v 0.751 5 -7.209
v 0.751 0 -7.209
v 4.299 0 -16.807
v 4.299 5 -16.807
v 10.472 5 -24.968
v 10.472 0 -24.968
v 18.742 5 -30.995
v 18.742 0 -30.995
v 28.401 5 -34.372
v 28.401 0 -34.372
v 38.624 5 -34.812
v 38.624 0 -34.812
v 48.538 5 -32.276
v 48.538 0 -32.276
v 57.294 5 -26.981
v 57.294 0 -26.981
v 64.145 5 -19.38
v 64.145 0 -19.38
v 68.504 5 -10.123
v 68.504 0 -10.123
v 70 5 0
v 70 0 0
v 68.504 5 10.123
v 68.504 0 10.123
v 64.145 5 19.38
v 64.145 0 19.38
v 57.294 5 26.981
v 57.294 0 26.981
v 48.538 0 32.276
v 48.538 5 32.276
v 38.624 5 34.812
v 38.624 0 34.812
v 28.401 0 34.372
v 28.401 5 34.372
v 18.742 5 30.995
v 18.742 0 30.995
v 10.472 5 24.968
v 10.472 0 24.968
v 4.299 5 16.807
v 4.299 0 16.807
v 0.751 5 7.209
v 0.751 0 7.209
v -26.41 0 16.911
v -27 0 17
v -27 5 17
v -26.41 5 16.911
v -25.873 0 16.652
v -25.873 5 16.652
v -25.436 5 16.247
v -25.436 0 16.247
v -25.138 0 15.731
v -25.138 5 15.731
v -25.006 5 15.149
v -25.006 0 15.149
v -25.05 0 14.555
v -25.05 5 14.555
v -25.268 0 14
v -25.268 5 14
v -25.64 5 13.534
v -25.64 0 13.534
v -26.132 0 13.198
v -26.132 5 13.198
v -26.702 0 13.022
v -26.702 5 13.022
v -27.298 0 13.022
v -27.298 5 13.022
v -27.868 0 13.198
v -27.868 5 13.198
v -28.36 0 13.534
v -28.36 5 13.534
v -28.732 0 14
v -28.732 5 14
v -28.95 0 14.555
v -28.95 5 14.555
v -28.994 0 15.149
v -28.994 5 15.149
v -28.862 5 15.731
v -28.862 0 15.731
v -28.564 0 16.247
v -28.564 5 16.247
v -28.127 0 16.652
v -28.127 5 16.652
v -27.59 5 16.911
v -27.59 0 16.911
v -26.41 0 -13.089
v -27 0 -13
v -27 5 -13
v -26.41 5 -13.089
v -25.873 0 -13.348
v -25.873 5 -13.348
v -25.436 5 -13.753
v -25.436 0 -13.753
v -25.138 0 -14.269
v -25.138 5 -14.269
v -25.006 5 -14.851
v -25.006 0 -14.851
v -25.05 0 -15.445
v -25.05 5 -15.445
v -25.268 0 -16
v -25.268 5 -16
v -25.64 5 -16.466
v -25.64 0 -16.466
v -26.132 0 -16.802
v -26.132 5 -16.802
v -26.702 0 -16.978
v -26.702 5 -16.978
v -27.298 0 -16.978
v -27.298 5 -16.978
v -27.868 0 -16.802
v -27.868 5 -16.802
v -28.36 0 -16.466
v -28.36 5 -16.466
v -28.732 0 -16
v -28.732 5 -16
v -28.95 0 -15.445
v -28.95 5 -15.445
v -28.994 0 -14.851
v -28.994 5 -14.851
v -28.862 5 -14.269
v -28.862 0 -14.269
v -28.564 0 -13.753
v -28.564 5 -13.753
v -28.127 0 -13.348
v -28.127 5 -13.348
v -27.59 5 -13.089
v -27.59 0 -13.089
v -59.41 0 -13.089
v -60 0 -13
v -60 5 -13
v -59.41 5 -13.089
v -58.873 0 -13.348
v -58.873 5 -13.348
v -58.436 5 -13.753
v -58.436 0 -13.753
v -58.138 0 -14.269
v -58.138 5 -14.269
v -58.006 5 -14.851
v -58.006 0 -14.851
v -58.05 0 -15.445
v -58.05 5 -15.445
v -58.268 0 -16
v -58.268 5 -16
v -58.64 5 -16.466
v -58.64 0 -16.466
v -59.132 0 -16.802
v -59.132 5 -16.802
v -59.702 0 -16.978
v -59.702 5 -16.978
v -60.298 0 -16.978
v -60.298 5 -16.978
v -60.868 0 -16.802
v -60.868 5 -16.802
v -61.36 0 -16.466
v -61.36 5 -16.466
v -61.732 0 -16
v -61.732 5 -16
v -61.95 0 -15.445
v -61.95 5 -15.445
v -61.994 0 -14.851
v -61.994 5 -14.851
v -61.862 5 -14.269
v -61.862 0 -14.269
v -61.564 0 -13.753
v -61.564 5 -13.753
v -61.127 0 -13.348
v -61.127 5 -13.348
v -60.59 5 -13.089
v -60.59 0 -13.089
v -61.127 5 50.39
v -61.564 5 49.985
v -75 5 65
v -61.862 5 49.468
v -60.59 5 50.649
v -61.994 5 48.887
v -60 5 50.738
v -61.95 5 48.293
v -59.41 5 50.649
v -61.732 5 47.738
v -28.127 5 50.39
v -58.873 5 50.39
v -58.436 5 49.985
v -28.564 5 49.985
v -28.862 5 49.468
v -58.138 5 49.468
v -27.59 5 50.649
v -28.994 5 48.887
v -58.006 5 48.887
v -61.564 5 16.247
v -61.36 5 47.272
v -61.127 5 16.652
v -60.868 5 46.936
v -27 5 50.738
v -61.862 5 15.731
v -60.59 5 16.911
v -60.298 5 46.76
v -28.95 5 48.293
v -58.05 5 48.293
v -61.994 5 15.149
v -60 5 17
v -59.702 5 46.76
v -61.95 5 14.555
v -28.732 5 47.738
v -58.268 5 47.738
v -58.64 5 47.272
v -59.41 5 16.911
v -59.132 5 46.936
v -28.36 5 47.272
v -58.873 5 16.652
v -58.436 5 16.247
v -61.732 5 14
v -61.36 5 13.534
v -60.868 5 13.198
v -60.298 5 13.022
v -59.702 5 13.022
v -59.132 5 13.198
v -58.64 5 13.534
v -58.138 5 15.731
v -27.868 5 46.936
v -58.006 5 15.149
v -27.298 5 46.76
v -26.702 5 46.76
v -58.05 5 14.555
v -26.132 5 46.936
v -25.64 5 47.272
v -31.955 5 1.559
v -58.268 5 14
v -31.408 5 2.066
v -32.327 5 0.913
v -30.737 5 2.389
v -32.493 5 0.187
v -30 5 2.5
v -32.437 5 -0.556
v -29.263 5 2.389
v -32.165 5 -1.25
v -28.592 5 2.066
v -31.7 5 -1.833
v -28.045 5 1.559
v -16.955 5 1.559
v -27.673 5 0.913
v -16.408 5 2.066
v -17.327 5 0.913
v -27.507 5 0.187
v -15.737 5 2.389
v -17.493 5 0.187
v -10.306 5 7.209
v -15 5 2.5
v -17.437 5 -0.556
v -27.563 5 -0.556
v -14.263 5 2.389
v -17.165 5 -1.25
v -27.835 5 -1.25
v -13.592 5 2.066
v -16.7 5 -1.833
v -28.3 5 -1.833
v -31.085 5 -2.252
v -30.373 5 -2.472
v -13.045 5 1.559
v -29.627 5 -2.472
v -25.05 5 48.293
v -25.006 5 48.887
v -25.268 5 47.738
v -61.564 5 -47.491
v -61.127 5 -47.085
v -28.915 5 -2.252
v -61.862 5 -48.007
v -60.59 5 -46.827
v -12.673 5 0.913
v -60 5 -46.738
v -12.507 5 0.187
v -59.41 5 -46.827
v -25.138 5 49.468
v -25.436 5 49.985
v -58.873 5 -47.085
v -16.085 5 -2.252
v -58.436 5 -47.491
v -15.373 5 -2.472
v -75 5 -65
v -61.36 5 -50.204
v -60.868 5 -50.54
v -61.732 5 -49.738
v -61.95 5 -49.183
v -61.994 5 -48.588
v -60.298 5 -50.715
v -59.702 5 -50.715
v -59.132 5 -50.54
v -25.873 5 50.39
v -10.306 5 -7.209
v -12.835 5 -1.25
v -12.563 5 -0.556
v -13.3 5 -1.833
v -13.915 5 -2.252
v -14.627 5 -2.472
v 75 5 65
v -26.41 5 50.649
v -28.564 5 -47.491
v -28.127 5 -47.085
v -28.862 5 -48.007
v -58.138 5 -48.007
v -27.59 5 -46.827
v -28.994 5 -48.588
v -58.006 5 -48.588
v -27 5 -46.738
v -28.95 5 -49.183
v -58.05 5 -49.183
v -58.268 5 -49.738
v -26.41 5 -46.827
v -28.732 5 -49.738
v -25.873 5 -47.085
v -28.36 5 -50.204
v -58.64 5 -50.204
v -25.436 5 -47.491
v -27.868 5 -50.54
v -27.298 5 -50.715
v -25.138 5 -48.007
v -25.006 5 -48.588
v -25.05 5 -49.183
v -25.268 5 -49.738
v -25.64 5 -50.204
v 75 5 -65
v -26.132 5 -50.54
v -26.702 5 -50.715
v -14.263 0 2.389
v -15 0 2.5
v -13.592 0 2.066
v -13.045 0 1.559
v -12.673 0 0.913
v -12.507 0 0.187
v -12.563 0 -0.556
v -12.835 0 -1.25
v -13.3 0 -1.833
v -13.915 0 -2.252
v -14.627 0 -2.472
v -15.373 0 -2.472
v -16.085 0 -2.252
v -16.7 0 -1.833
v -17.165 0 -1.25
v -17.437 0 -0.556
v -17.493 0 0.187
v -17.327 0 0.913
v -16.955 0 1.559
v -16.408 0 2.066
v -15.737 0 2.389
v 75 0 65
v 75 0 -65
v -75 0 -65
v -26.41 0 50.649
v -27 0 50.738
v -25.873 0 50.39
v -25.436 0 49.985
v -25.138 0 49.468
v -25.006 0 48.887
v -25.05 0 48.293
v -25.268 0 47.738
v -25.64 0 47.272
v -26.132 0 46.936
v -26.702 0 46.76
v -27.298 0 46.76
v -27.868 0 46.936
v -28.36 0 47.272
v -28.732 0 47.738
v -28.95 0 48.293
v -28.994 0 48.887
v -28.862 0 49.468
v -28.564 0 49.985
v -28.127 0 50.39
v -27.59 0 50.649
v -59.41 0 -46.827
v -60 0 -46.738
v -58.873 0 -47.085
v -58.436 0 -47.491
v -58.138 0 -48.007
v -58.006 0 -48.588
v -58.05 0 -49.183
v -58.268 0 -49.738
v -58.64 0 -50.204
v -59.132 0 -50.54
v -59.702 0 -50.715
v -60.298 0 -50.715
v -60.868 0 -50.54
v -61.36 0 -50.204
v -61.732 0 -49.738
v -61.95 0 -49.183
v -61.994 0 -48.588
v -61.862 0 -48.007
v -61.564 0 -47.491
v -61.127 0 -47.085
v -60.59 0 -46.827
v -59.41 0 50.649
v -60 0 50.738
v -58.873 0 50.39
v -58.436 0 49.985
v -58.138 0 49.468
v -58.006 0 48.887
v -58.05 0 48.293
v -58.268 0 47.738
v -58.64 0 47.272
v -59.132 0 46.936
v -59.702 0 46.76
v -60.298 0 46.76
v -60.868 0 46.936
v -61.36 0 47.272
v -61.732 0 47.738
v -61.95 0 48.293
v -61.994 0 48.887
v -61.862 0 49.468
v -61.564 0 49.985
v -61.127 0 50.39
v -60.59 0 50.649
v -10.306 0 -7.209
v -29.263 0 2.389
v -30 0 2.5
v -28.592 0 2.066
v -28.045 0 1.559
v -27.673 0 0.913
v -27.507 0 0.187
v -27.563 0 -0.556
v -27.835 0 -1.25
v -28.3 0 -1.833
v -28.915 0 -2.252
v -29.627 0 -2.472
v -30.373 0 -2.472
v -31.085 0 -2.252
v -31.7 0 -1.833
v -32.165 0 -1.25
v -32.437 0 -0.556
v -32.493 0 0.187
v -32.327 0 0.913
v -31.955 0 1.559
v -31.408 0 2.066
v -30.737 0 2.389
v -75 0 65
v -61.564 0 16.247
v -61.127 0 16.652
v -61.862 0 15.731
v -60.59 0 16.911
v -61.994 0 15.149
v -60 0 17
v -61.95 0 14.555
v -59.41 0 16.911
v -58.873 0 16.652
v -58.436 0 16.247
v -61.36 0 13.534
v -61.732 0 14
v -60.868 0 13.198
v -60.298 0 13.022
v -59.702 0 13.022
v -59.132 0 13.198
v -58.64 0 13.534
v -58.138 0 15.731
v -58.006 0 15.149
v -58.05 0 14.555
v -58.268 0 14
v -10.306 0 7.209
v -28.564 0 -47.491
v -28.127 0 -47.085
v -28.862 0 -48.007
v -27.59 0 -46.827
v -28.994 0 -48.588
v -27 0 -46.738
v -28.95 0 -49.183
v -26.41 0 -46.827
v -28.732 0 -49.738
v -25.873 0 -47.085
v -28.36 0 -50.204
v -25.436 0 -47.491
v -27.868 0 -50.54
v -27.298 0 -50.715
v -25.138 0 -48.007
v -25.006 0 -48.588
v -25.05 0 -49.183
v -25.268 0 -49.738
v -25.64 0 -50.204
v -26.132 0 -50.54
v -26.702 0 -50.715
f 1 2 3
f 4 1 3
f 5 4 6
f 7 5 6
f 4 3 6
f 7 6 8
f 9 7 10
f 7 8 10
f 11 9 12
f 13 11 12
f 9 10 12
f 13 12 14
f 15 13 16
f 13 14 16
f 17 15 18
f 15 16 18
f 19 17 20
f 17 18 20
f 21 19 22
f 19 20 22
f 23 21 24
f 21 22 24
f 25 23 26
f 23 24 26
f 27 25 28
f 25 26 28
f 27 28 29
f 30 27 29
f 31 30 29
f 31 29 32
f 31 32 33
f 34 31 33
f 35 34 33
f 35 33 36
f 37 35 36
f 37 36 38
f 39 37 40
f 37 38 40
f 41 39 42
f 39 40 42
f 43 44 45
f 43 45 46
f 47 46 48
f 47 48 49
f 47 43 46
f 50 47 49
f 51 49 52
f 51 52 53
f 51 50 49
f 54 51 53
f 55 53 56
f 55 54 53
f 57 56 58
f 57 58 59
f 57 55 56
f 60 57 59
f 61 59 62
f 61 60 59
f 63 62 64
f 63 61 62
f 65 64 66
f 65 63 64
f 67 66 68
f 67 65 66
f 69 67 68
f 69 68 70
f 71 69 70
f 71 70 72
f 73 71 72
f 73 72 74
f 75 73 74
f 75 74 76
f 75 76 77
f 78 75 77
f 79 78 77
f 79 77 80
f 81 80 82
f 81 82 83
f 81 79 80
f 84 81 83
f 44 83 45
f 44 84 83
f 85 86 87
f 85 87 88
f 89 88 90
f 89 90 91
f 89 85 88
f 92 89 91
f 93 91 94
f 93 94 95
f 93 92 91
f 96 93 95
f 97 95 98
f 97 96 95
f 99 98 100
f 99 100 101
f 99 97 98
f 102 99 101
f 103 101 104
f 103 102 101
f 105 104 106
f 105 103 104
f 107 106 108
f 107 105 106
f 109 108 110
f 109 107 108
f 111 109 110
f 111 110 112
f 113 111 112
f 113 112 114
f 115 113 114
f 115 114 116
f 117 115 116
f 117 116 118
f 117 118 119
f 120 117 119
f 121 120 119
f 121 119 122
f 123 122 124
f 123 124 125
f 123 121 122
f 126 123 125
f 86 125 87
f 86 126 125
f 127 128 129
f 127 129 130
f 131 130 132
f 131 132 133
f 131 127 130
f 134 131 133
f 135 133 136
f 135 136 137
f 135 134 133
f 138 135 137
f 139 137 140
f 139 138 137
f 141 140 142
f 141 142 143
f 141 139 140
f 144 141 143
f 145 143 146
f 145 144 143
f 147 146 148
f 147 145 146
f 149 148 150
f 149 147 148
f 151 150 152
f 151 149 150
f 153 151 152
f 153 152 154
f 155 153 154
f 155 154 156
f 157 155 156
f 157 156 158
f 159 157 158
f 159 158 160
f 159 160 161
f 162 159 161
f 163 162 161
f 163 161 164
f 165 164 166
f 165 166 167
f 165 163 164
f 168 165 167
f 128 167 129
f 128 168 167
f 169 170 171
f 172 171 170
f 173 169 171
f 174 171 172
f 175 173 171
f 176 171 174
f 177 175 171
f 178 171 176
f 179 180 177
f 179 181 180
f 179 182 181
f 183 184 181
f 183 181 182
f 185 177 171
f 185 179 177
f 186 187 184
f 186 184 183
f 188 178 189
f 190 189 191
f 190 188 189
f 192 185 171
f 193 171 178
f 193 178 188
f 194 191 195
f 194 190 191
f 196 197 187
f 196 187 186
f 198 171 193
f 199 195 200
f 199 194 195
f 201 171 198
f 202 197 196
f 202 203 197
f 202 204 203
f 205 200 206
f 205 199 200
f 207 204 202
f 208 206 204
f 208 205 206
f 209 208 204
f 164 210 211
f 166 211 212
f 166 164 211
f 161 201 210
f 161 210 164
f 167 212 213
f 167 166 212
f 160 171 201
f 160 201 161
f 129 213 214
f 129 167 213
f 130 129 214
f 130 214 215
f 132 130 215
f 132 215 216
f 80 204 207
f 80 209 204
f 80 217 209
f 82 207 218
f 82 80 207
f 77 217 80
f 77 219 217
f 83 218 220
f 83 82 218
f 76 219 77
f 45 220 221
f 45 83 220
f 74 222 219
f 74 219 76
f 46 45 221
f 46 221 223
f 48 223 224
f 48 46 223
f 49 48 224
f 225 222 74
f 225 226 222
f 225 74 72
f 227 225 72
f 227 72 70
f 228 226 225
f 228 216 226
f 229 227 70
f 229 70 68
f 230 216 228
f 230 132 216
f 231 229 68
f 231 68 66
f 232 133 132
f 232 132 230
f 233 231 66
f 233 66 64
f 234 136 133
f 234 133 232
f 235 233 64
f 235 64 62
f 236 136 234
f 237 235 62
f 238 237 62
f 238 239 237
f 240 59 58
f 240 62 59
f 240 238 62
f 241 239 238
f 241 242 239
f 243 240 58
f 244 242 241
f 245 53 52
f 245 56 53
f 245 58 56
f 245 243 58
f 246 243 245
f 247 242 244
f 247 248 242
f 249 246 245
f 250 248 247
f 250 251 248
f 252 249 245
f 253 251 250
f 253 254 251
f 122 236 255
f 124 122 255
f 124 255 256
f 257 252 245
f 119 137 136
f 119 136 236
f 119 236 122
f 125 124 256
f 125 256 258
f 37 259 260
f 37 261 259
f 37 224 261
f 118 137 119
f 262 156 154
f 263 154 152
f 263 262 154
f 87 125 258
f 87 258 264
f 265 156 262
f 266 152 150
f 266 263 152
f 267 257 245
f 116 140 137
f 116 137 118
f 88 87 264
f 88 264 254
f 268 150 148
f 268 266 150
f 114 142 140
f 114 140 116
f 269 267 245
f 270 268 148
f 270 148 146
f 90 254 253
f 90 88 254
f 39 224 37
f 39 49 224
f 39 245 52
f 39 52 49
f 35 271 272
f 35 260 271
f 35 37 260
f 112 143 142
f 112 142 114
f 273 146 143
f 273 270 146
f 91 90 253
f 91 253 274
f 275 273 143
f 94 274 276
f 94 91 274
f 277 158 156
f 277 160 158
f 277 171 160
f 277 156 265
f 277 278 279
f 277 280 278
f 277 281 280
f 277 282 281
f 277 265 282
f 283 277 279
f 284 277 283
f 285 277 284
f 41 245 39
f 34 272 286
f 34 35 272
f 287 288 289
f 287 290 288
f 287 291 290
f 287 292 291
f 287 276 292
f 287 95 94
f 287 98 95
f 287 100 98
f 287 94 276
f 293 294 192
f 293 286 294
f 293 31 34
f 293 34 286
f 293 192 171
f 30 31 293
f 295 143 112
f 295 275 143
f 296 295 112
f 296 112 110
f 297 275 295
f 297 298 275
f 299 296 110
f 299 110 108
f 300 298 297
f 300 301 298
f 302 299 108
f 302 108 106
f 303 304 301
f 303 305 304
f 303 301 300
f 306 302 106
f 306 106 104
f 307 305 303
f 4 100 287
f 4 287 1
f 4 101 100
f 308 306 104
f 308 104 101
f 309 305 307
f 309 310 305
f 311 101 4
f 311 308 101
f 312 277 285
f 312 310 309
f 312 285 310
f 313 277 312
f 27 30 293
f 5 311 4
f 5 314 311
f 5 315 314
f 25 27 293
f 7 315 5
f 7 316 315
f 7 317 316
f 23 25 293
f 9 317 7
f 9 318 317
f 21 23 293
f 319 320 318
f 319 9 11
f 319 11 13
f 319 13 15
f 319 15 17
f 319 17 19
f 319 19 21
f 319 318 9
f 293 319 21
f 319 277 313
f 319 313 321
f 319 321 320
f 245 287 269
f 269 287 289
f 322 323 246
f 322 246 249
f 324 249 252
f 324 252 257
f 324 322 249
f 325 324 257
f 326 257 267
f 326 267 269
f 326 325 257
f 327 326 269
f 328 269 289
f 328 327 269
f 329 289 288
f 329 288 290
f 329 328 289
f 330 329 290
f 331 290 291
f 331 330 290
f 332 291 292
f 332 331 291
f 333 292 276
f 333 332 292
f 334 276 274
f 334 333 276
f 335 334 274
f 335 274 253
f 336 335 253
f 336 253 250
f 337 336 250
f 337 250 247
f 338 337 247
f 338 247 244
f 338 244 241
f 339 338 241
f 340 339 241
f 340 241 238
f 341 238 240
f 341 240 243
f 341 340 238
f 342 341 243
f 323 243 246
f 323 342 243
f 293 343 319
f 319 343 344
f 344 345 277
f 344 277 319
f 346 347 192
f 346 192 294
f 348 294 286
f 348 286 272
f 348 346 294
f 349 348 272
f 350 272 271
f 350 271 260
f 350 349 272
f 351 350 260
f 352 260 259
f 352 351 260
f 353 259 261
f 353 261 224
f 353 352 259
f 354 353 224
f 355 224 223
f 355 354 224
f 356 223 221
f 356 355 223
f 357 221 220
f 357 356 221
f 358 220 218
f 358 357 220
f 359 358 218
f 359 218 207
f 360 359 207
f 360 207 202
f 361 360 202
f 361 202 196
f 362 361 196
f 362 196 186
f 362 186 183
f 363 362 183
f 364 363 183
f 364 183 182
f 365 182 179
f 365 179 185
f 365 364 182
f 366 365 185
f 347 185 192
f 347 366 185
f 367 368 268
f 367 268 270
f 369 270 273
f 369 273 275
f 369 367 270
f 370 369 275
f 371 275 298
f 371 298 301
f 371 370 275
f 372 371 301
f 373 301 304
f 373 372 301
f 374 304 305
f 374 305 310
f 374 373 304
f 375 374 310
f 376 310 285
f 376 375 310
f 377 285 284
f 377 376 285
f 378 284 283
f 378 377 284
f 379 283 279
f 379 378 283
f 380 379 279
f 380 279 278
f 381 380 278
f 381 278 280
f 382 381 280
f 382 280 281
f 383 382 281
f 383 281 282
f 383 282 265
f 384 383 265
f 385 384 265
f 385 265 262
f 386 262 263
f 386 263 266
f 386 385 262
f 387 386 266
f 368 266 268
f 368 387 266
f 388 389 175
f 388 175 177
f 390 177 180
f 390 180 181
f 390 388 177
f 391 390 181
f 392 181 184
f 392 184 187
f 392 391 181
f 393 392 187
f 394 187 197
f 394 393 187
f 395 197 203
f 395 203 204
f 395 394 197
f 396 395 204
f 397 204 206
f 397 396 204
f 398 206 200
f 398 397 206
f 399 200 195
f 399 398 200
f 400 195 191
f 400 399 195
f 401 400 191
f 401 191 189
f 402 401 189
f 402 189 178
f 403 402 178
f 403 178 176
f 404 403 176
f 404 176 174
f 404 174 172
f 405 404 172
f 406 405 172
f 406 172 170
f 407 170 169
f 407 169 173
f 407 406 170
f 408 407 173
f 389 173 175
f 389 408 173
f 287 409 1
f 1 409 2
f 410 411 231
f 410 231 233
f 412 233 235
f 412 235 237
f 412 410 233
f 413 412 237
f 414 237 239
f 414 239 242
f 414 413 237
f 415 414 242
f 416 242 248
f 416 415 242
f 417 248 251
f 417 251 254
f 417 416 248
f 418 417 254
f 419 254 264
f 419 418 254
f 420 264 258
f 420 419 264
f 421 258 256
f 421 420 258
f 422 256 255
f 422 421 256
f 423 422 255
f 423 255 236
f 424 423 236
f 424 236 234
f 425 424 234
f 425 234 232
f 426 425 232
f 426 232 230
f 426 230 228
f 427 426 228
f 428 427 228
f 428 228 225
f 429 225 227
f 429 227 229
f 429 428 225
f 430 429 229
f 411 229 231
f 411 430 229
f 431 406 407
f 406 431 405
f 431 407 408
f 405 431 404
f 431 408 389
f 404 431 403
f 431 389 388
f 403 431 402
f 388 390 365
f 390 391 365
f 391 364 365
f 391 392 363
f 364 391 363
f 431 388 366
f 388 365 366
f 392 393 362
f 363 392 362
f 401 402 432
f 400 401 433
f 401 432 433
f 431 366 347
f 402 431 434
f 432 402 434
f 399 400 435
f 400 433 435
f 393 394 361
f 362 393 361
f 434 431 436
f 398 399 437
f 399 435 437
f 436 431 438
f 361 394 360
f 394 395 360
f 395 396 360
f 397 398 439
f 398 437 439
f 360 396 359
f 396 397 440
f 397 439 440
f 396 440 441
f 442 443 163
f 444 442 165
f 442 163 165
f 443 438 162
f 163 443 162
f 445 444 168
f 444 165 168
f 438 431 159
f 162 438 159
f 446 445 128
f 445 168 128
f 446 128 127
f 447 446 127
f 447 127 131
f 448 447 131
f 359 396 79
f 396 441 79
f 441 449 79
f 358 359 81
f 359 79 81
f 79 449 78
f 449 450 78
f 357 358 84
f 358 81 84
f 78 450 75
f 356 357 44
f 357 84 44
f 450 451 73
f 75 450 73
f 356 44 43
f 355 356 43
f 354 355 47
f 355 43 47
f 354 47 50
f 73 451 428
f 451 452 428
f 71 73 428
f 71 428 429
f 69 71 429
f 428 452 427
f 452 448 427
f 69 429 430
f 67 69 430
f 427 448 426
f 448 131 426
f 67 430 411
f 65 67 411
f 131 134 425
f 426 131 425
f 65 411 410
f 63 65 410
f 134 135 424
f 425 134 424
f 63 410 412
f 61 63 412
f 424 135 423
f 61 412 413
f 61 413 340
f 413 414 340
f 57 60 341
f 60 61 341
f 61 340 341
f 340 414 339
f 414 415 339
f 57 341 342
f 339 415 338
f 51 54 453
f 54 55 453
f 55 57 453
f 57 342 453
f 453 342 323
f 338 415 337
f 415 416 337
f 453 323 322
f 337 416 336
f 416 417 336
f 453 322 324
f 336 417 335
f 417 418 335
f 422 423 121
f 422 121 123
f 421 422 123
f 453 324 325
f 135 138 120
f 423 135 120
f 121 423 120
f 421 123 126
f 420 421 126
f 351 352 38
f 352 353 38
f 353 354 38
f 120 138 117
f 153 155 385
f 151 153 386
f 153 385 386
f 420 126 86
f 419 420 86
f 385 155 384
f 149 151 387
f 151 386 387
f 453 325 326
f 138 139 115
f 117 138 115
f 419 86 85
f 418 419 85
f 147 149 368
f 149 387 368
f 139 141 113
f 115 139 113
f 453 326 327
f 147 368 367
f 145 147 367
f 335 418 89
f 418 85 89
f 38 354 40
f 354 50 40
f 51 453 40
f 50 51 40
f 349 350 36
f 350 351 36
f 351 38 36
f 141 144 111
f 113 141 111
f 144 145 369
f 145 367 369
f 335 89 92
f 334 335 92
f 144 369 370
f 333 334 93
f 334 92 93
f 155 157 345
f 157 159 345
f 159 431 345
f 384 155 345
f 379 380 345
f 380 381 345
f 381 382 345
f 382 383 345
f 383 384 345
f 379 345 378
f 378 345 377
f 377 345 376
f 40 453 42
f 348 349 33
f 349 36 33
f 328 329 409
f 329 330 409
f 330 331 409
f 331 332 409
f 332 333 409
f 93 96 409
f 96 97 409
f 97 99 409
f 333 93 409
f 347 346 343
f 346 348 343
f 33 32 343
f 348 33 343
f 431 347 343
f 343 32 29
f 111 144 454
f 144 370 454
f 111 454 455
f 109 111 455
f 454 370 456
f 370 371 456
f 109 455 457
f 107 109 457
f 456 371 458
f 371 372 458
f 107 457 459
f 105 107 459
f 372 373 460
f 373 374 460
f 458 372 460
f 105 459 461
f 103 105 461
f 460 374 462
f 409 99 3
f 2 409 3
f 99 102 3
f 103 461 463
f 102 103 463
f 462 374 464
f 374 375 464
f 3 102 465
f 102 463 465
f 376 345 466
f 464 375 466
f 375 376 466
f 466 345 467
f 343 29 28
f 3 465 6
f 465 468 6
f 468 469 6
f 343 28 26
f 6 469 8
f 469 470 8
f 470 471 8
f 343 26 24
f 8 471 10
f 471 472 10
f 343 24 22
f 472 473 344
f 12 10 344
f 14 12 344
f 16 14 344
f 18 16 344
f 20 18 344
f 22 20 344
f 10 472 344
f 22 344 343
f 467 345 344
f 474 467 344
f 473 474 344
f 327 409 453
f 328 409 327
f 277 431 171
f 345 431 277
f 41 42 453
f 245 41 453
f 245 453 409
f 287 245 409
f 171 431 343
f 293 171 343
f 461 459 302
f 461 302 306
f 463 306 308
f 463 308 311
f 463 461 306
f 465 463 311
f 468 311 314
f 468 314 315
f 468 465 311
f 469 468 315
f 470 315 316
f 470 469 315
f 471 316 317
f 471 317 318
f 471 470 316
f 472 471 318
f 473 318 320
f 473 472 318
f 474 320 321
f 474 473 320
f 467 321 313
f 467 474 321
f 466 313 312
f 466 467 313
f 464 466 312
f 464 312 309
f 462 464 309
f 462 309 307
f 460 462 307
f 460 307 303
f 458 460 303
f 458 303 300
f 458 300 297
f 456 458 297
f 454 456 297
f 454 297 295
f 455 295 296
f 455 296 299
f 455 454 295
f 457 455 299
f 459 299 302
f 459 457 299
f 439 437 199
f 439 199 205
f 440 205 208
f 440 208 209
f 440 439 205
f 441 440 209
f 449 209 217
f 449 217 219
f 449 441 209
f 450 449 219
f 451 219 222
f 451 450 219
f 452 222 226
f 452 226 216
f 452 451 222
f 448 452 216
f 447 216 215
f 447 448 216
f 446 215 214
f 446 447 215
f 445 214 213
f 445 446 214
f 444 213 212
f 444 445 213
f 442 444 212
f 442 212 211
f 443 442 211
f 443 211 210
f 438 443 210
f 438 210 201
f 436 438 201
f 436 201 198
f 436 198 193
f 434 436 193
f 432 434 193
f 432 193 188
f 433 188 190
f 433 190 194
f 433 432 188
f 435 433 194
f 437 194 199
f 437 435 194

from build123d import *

# Parameters (mm, degrees)
SKETCH1_W           = 150
SKETCH1_H           = 130
SKETCH1_R           = 2.500000001
SKETCH1_R_2         = 2
BOSS_EXTRUDE1_DEPTH = 5


with BuildPart() as part:
    # Sketch1 → Boss-Extrude1 (new body)
    with BuildSketch(Plane(origin=(0, 0, 0), x_dir=(1, 0, 0), z_dir=(0, 1, 0))):
        Rectangle(SKETCH1_W, SKETCH1_H)
        with Locations(Location((-15.000000001, 0, 0), (0, 0, 270))):
            Circle(SKETCH1_R, mode=Mode.SUBTRACT)
        with Locations(Location((-30.000000001, 0, 0), (0, 0, 270))):
            Circle(SKETCH1_R, mode=Mode.SUBTRACT)
        with Locations(Location((-60, -15, 0), (0, 0, 270))):
            Circle(SKETCH1_R_2, mode=Mode.SUBTRACT)
        with Locations(Location((-60, -48.737765205, 0), (0, 0, 270))):
            Circle(SKETCH1_R_2, mode=Mode.SUBTRACT)
        with Locations(Location((-27, -48.737765205, 0), (0, 0, 270))):
            Circle(SKETCH1_R_2, mode=Mode.SUBTRACT)
        with Locations(Location((-27, -15, 0), (0, 0, 270))):
            Circle(SKETCH1_R_2, mode=Mode.SUBTRACT)
        with Locations(Location((-27, 15, 0), (0, 0, 270))):
            Circle(SKETCH1_R_2, mode=Mode.SUBTRACT)
        with Locations(Location((-60, 15, 0), (0, 0, 270))):
            Circle(SKETCH1_R_2, mode=Mode.SUBTRACT)
        with Locations(Location((-60, 48.737765205, 0), (0, 0, 270))):
            Circle(SKETCH1_R_2, mode=Mode.SUBTRACT)
        with Locations(Location((-27, 48.737765205, 0), (0, 0, 270))):
            Circle(SKETCH1_R_2, mode=Mode.SUBTRACT)
        with BuildLine():
            Line((0.750570036, -7.209476205), (-10.305683507, -7.209476205))
            Line((-10.305683507, -7.209476205), (-10.305683507, 7.209476205))
            Line((-10.305683507, 7.209476205), (0.750570036, 7.209476205))
            ThreePointArc((0.750570036, 7.209476205), (70, 0), (0.750570036, -7.209476205))
        make_face(mode=Mode.SUBTRACT)
    extrude(amount=BOSS_EXTRUDE1_DEPTH)


solid = part.part
